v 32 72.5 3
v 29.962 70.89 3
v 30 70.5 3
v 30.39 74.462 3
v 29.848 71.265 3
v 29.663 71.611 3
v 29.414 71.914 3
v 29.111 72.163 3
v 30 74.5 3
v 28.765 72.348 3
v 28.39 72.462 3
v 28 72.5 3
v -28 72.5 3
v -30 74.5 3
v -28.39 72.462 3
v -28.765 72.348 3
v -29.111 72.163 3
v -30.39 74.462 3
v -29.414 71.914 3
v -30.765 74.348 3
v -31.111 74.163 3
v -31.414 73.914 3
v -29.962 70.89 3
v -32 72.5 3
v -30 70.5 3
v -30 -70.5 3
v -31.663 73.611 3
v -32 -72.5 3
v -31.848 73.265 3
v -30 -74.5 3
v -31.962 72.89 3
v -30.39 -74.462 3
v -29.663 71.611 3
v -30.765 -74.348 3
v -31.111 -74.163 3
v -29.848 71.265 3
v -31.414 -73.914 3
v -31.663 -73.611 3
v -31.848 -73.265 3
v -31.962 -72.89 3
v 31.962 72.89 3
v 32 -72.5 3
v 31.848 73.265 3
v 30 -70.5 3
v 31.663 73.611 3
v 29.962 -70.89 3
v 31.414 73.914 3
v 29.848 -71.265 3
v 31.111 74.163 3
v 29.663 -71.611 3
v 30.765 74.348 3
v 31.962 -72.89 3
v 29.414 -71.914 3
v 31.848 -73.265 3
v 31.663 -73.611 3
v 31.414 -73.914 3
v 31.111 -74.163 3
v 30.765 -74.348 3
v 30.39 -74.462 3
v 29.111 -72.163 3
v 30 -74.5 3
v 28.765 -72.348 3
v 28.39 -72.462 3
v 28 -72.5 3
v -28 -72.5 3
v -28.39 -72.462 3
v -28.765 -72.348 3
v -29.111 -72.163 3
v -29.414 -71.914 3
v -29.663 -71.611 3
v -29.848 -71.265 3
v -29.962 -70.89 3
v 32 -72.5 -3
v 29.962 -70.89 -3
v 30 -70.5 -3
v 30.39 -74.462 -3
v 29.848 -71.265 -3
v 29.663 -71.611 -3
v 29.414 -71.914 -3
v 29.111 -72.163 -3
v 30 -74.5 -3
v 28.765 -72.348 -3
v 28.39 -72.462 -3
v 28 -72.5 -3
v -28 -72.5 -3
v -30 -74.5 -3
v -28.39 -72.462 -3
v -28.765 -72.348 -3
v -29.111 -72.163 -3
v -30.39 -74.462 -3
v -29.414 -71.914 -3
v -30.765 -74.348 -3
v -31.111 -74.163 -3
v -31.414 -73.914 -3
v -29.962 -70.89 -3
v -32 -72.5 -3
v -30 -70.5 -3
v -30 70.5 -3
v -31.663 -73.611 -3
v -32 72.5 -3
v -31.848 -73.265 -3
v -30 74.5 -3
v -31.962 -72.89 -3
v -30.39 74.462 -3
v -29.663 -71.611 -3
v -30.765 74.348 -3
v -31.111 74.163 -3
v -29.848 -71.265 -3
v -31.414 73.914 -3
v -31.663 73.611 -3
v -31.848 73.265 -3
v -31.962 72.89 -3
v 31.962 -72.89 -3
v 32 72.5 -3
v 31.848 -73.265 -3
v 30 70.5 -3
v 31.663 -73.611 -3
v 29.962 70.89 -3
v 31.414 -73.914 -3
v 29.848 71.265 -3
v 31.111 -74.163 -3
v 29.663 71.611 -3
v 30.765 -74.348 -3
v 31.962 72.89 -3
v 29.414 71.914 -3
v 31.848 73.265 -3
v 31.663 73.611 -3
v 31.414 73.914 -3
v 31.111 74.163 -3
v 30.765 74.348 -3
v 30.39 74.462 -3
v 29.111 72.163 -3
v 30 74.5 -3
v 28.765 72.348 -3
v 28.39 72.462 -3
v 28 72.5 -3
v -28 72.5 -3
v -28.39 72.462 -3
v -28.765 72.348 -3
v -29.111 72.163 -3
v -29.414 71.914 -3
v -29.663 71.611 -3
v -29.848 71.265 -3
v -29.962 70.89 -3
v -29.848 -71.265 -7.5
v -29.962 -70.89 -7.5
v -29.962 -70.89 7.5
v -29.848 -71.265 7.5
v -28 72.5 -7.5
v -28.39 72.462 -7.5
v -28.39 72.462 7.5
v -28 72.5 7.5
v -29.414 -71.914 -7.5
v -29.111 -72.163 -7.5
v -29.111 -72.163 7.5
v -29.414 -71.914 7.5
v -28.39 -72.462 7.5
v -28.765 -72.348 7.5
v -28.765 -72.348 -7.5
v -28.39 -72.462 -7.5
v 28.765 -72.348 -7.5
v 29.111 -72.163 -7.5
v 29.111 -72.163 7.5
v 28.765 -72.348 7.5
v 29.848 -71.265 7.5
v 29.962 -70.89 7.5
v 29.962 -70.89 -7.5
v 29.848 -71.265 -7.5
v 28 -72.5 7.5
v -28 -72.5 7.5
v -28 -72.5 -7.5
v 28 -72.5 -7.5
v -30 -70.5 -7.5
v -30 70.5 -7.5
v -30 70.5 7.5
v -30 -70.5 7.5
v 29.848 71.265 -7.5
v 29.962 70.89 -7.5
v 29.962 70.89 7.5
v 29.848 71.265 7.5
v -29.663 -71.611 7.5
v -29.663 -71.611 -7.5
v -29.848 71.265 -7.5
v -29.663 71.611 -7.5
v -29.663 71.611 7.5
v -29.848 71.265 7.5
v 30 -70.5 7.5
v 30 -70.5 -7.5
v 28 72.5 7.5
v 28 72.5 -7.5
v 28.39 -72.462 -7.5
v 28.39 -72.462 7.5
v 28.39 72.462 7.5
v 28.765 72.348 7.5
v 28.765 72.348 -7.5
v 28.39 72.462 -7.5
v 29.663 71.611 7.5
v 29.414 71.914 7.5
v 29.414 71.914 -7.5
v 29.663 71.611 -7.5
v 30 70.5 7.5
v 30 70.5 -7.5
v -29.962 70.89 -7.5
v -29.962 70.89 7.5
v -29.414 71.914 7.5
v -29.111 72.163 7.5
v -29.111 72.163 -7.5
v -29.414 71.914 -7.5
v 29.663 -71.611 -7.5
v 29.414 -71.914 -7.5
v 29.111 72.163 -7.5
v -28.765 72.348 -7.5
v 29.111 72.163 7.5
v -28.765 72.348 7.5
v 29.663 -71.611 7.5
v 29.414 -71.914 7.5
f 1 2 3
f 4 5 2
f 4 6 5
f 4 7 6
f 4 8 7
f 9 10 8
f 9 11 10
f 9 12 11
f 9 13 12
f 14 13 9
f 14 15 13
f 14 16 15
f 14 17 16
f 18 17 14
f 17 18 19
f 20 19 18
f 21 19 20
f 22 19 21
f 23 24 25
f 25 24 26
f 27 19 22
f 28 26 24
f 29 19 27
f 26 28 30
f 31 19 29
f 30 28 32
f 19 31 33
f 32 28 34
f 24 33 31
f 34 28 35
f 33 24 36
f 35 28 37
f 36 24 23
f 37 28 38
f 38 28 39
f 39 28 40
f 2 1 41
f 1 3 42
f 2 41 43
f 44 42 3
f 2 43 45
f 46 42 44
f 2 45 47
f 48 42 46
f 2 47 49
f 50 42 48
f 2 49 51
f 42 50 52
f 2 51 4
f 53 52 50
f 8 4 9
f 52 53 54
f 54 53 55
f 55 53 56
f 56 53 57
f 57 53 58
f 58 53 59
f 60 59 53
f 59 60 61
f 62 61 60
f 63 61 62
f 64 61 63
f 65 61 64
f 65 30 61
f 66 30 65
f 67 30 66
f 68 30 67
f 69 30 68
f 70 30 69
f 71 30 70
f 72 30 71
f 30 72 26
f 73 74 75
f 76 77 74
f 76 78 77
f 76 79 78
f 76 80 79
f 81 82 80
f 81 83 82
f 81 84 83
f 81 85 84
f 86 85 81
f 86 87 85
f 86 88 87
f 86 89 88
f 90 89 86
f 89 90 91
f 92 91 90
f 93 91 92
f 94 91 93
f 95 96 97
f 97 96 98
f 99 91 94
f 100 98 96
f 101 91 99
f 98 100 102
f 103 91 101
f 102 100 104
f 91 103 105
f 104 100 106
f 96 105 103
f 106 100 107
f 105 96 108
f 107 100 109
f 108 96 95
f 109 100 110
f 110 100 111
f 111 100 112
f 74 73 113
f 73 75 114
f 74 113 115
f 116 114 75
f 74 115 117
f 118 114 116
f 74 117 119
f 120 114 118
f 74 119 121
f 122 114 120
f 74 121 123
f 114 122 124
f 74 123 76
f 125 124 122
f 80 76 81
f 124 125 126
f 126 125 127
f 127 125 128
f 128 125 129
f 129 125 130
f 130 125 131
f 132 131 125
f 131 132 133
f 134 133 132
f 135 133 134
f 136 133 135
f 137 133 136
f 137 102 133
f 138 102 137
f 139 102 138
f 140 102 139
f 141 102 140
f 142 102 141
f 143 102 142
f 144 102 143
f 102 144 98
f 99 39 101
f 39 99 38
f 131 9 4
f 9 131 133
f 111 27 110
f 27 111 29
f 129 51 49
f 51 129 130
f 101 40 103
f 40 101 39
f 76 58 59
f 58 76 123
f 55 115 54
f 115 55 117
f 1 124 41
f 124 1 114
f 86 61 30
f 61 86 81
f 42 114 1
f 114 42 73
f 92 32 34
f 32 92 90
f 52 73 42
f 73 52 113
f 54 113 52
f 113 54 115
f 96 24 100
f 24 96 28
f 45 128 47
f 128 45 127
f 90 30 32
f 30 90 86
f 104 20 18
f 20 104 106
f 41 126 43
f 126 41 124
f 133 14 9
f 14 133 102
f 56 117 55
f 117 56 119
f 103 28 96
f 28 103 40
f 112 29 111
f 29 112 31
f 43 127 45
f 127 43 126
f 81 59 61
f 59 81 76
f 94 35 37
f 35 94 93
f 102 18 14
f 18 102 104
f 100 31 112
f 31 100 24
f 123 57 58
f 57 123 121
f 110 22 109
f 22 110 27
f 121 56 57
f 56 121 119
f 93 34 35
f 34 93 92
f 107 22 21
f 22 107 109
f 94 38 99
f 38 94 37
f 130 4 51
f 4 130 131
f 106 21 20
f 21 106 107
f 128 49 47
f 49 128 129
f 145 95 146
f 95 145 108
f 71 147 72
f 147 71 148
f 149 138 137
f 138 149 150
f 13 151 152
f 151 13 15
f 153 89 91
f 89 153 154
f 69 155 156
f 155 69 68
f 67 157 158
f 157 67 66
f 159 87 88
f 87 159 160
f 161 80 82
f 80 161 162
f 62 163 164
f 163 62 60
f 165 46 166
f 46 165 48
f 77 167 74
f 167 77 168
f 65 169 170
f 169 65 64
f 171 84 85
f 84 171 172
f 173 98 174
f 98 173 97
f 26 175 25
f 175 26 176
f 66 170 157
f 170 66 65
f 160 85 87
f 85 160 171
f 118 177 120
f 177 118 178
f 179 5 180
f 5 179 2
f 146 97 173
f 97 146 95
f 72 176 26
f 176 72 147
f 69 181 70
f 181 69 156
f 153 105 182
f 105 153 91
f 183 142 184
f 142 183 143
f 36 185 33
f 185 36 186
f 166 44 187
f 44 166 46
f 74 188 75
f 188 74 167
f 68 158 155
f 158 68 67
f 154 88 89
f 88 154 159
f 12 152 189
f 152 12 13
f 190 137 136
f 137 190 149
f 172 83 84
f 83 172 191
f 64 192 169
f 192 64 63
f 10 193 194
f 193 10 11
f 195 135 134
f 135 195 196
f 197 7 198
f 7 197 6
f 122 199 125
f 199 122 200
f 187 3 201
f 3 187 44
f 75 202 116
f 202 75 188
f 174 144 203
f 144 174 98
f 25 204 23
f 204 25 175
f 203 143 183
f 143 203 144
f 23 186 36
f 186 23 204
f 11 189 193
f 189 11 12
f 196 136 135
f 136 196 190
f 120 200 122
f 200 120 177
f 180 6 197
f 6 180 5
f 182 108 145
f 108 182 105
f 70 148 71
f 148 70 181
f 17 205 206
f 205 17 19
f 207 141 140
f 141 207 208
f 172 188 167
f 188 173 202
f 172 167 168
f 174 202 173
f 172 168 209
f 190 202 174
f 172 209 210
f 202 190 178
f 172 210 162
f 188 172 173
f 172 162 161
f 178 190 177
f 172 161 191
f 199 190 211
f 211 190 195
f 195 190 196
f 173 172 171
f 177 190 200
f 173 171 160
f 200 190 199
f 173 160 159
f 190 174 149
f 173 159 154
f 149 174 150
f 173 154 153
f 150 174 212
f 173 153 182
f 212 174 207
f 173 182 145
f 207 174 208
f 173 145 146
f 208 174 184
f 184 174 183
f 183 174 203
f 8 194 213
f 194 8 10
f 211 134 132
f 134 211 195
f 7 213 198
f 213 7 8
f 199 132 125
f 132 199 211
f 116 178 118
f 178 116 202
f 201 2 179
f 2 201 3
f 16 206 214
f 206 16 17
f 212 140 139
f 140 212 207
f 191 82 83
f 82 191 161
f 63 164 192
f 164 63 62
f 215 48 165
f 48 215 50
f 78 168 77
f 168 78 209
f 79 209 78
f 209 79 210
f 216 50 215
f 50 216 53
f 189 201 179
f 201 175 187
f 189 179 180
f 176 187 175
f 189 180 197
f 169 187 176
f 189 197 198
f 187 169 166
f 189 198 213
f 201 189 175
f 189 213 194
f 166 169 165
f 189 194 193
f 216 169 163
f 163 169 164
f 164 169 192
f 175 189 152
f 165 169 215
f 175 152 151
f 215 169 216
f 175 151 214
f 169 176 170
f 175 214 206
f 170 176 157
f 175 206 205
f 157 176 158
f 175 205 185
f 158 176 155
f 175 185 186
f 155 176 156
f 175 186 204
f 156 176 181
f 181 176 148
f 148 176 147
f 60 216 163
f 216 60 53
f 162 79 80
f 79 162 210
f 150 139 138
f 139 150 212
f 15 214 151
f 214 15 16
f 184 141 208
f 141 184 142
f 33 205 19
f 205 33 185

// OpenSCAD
echo("Работа Пермякова Максима");
len_phone = 145;
width_phone = 60;
thickness_phone = 6;

corner_round = 9;

cube([width_phone, len_phone, thickness_phone], center=true);

hull() {
    color("red")
    translate([width_phone/2, len_phone/2, 0])
    cylinder(h=thickness_phone, d=corner_round, $fn=32, center=true);

    mirror([1,0,0])
    color("red")
    translate([width_phone/2, len_phone/2, 0])
    cylinder(h=thickness_phone, d=corner_round, $fn=32, center=true);

    mirror([0,1,0])
    color("red")
    translate([width_phone/2, len_phone/2, 0])
    cylinder(h=thickness_phone, d=corner_round, $fn=32, center=true);

    mirror([1,0,0])
    mirror([0,1,0])
    color("red")
    translate([width_phone/2, len_phone/2, 0])
    cylinder(h=thickness_phone, d=corner_round, $fn=32, center=true);
}

corner_round = 4;

hull() {
    color("red")
    translate([width_phone/2-corner_round/2, len_phone/2-corner_round/2, 0])
    cylinder(h=15, d=corner_round, $fn=32, center=true);

    mirror([1,0,0])
    color("red")
    translate([width_phone/2-corner_round/2, len_phone/2-corner_round/2, 0])
    cylinder(h=15, d=corner_round, $fn=32, center=true);

    mirror([0,1,0])
    color("red")
    translate([width_phone/2-corner_round/2, len_phone/2-corner_round/2, 0])
    cylinder(h=15, d=corner_round, $fn=32, center=true);

    mirror([1,0,0])
    mirror([0,1,0])
    color("red")
    translate([width_phone/2-corner_round/2, len_phone/2-corner_round/2, 0])
    cylinder(h=15, d=corner_round, $fn=32, center=true);
}
